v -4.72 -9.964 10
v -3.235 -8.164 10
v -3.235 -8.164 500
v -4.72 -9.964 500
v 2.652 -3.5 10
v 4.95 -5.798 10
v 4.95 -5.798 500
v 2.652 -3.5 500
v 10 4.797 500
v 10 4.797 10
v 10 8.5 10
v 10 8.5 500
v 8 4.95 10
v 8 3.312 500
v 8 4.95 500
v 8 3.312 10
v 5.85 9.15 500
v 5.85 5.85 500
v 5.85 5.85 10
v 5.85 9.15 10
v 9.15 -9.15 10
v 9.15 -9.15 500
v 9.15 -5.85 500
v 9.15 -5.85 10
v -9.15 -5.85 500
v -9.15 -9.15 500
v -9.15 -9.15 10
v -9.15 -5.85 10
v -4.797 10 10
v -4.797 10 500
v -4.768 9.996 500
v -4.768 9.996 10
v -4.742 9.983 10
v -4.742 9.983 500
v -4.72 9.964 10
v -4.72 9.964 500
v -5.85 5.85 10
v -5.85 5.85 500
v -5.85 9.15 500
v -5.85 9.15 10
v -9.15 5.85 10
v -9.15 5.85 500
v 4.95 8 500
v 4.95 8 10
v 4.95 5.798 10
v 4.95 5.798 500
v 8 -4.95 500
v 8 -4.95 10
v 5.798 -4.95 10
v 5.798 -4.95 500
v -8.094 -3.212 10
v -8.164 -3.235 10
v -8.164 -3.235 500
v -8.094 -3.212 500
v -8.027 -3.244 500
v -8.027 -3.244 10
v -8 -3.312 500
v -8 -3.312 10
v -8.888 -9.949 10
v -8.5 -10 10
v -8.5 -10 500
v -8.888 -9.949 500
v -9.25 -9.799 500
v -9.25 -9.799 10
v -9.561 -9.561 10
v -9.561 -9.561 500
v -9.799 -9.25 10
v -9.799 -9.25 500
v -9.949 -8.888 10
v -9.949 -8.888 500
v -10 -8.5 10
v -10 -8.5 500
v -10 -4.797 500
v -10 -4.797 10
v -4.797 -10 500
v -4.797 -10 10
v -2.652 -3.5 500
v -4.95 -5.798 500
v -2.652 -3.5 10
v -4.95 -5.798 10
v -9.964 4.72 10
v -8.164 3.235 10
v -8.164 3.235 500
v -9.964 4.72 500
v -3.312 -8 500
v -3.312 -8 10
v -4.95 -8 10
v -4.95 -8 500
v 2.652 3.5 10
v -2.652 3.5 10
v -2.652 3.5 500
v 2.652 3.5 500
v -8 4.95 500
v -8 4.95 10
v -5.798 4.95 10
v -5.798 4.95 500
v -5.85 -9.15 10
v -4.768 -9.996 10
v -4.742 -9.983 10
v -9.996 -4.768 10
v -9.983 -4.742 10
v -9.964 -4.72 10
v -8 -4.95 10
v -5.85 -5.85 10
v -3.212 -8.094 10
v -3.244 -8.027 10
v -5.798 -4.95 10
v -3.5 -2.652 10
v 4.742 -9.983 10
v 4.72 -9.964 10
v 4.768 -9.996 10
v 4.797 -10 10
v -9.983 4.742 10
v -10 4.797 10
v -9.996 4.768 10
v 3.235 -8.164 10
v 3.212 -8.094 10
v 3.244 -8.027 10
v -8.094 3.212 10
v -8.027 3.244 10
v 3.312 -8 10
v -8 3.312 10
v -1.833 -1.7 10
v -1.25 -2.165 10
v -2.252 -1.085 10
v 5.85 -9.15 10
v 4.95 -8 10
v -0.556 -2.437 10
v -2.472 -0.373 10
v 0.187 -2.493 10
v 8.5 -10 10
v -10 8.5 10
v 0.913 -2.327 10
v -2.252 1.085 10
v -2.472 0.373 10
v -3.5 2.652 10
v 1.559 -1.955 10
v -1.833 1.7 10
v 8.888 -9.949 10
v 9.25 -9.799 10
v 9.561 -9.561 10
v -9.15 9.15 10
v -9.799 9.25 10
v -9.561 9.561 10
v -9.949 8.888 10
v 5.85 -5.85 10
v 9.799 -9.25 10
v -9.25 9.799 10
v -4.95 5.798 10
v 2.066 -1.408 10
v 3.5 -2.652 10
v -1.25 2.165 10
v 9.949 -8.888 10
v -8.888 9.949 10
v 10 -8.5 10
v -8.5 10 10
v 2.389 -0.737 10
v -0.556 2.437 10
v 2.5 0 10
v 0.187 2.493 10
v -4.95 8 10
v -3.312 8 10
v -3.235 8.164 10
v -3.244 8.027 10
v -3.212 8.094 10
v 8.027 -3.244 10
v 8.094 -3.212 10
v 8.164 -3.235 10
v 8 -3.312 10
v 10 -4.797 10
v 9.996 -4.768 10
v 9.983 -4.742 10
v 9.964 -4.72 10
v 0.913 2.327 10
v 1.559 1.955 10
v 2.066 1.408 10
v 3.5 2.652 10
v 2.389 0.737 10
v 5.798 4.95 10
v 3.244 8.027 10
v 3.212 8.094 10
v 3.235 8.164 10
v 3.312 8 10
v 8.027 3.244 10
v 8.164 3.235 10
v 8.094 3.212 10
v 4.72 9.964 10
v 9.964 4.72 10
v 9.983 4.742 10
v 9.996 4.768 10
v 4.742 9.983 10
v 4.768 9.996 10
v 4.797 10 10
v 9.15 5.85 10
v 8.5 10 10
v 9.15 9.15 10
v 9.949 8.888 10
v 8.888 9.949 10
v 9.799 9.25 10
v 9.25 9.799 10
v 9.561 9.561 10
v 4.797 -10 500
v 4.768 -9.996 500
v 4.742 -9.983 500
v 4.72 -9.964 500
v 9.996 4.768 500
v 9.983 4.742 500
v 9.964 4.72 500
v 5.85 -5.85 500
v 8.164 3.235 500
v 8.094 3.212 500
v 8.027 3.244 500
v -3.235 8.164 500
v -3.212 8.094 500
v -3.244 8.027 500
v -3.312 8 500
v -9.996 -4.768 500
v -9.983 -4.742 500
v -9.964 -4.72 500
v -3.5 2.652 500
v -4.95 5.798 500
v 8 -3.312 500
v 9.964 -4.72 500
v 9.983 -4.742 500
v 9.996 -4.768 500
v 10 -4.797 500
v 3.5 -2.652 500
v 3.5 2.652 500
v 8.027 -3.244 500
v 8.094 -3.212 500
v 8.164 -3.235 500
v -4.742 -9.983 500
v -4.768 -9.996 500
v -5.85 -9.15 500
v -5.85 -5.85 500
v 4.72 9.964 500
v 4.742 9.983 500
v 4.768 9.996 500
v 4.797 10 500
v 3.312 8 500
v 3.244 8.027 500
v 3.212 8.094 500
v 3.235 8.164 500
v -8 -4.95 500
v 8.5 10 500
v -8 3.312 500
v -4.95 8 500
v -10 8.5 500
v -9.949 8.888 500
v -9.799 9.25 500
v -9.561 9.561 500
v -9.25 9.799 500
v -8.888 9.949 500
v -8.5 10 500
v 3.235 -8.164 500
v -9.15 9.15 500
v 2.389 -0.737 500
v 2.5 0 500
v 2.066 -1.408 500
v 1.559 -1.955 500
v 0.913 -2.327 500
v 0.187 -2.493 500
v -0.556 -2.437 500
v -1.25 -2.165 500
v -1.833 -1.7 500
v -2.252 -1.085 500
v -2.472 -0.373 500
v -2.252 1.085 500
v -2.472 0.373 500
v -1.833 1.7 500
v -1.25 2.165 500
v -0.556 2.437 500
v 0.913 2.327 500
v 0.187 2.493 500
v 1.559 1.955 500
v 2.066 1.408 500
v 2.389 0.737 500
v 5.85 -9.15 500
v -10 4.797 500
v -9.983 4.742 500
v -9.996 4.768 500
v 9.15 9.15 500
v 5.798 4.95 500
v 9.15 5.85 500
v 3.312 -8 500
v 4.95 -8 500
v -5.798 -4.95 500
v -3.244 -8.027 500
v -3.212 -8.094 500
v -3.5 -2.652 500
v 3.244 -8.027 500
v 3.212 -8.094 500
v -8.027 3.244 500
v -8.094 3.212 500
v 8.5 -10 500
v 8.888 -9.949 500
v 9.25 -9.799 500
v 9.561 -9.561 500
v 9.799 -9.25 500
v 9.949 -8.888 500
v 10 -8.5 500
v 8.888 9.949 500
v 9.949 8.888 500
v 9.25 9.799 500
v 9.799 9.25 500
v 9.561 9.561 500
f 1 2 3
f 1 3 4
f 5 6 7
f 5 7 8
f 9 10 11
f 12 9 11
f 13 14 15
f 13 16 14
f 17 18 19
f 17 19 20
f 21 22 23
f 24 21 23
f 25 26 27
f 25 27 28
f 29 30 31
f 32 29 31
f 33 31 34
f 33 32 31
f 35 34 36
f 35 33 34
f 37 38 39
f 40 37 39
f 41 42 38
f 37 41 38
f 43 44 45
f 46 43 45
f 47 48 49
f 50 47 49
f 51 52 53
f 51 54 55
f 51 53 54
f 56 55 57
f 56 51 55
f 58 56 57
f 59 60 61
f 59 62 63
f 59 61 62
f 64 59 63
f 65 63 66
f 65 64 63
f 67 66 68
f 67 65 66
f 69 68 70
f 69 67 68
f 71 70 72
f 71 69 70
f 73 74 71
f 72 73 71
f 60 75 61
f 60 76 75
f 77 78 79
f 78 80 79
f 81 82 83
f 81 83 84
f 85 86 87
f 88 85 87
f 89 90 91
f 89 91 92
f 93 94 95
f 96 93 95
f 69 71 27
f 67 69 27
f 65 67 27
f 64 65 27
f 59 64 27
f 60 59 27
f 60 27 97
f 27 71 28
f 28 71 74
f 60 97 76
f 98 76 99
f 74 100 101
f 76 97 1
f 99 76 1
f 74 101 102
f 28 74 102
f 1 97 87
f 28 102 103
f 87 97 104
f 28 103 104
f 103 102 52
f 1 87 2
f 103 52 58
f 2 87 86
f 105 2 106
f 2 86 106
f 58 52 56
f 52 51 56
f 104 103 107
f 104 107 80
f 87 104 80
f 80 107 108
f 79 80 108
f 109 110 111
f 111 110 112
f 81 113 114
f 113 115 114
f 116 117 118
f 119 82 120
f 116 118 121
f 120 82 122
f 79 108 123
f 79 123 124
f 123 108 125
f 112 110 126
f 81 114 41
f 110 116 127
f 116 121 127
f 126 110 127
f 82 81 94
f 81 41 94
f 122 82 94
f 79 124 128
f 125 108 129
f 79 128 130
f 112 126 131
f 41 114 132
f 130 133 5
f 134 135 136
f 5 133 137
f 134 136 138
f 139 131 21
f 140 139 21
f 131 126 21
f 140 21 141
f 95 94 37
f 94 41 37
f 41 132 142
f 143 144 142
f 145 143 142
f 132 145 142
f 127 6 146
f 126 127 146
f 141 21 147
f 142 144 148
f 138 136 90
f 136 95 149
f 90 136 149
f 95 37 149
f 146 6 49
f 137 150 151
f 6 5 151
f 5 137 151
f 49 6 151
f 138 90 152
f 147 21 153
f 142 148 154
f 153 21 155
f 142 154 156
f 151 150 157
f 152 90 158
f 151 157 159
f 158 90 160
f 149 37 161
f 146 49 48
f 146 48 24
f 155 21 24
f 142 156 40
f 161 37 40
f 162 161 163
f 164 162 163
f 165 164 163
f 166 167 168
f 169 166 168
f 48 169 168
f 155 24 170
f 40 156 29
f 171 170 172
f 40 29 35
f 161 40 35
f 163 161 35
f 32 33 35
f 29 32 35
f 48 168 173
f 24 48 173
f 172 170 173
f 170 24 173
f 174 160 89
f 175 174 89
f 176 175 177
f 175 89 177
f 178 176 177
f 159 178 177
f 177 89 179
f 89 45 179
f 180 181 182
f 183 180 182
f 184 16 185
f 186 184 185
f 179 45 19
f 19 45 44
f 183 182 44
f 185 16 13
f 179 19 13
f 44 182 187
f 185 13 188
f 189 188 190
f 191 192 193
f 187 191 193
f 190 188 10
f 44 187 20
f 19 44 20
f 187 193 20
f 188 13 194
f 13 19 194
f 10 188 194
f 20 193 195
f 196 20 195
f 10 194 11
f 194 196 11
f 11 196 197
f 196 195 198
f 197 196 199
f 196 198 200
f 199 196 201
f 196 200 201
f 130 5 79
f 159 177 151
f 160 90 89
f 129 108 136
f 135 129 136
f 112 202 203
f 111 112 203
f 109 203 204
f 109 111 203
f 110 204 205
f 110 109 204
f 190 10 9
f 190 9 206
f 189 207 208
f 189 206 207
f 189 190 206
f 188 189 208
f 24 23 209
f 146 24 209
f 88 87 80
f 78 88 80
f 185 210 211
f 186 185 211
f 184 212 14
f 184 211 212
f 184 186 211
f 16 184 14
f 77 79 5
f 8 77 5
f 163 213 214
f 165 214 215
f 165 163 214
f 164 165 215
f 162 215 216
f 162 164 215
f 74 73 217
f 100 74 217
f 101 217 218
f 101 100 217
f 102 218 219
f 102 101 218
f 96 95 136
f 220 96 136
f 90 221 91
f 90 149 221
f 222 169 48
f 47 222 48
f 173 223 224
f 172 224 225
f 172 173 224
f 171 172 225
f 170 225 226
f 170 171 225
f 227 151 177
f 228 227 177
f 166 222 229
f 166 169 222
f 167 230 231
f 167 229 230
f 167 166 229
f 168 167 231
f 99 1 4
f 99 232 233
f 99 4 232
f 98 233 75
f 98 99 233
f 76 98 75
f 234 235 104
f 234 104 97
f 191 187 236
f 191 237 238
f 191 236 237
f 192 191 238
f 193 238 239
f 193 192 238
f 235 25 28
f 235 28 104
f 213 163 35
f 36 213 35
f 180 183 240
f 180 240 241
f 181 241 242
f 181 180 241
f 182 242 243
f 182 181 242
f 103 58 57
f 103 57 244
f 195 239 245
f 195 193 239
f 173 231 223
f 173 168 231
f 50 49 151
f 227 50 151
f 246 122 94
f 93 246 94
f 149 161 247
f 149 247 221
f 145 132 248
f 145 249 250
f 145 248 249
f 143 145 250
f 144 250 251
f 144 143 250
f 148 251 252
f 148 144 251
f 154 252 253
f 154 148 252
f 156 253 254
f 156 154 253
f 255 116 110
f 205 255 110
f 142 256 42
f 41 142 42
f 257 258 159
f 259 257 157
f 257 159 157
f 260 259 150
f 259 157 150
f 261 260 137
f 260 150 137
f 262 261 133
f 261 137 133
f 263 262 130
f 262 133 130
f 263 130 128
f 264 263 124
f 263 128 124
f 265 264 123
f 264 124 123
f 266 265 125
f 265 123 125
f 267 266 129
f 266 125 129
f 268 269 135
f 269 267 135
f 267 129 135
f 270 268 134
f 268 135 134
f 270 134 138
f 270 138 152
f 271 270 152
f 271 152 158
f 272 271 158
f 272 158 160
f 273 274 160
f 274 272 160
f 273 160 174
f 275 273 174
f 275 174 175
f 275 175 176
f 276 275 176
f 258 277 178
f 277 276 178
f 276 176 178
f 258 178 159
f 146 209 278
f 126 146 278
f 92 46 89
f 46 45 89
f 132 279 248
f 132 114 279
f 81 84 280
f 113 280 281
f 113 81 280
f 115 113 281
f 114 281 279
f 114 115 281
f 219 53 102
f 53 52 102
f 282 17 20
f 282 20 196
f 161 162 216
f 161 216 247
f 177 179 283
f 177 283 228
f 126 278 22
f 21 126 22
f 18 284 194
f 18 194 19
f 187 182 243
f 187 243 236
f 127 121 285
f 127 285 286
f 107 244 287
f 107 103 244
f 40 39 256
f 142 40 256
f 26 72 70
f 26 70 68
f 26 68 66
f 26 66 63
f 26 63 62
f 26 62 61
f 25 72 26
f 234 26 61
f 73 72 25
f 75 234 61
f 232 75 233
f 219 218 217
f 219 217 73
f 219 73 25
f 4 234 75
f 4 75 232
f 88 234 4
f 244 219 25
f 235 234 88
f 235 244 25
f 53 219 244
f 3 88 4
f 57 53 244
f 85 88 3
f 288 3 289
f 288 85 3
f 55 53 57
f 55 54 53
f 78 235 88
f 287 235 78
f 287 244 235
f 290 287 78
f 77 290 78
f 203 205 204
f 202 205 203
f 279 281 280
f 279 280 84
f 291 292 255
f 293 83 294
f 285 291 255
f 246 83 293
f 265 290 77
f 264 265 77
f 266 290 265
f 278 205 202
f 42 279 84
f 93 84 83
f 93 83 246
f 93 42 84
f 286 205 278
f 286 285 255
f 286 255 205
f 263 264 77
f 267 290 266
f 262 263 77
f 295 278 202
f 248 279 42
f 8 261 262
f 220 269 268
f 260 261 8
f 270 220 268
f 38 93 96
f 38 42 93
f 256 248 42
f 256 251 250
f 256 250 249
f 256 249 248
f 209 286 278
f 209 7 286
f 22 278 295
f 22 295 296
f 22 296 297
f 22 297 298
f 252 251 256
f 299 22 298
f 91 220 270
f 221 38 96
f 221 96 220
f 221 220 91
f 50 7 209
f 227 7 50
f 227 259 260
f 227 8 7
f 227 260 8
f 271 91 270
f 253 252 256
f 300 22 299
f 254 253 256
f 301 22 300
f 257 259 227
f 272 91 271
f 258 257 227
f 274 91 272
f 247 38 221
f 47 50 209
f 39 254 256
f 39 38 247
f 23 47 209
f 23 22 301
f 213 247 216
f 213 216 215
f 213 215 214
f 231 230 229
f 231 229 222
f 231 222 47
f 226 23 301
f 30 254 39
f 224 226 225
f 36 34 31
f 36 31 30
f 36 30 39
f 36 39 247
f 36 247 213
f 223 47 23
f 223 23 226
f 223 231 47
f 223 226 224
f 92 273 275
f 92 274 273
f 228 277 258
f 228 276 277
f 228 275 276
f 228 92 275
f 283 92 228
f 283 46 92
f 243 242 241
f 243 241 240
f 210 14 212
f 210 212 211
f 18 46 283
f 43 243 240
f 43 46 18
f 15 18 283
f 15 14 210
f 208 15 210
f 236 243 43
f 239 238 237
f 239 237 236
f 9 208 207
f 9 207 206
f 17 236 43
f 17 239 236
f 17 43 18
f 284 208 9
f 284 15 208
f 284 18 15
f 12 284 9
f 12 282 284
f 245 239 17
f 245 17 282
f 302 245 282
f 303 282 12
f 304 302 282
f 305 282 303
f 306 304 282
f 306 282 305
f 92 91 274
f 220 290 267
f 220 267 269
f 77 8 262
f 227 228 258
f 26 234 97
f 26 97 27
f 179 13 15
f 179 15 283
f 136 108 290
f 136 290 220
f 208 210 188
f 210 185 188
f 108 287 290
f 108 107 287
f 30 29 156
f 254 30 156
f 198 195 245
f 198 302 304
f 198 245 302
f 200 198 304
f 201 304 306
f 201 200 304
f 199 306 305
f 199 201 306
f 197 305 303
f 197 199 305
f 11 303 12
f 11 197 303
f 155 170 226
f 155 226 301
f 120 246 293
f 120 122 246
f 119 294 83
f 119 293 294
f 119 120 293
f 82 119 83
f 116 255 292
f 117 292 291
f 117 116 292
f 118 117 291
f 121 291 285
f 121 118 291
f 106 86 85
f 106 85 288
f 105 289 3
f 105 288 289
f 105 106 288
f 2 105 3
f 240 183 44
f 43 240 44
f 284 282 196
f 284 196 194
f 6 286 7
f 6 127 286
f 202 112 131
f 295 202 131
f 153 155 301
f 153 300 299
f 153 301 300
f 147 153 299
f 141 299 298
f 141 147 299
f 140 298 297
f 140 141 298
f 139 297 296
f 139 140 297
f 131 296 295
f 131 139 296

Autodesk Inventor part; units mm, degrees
ref_plane "Начальная плоскость" through (0, 0, 10) normal (0, 0, 1) x (1, 0, 0)
ref_plane "Конечная плоскость" through (0, 0, 500) normal (0, 0, 1) x (1, 0, 0)
sketch "Эскиз" plane through (0, 0, 0) normal (0, 0, 1) x (1, 0, 0)
  line L0 (-14.4349, 0) -> (14.4349, 0) projected
  line L1 (0, -14) -> (0, 14) projected
  line L2 (0, 0) -> (7.5, 7.5) construction
  circle A0 centre (7.5, 7.5) radius 1.65 construction
  line L3 (5.85, 9.15) -> (9.15, 9.15)
  line L4 (9.15, 9.15) -> (9.15, 5.85)
  line L5 (9.15, 5.85) -> (5.85, 5.85)
  line L6 (5.85, 5.85) -> (5.85, 9.15)
  line L7 (3.235, 8.1636) -> (4.72, 9.9636)
  line L8 (4.7971, 10) -> (8.5, 10)
  line L9 (3.3121, 8) -> (4.95, 8)
  line L10 (4.95, 8) -> (4.95, 5.7985)
  line L11 (4.95, 5.7985) -> (2.6515, 3.5)
  line L12 (0, 3.5) -> (2.6515, 3.5)
  circle A1 centre (0, 0) radius 2.5
  line L13 (8.1636, 3.235) -> (9.9636, 4.72)
  line L14 (10, 4.7971) -> (10, 8.5)
  line L15 (8, 3.3121) -> (8, 4.95)
  line L16 (8, 4.95) -> (5.7985, 4.95)
  line L17 (5.7985, 4.95) -> (3.5, 2.6515)
  line L18 (3.5, 0) -> (3.5, 2.6515)
  arc A2 (10, 8.5) -> (8.5, 10) centre (8.5, 8.5) ccw
  line L19 (0, 0) -> (-7.5, 7.5) construction
  circle A3 centre (-7.5, 7.5) radius 1.65 construction
  line L20 (-5.85, 9.15) -> (-9.15, 9.15)
  line L21 (-9.15, 9.15) -> (-9.15, 5.85)
  line L22 (-9.15, 5.85) -> (-5.85, 5.85)
  line L23 (-5.85, 5.85) -> (-5.85, 9.15)
  line L24 (-3.235, 8.1636) -> (-4.72, 9.9636)
  line L25 (-4.7971, 10) -> (-8.5, 10)
  line L26 (-3.3121, 8) -> (-4.95, 8)
  line L27 (-4.95, 8) -> (-4.95, 5.7985)
  line L28 (-4.95, 5.7985) -> (-2.6515, 3.5)
  line L29 (0, 3.5) -> (-2.6515, 3.5)
  line L30 (-3.5, 0) -> (-3.5, 2.6515)
  line L31 (-5.7985, 4.95) -> (-3.5, 2.6515)
  line L32 (-8, 4.95) -> (-5.7985, 4.95)
  line L33 (-8, 3.3121) -> (-8, 4.95)
  line L34 (-8.1636, 3.235) -> (-9.9636, 4.72)
  line L35 (-10, 4.7971) -> (-10, 8.5)
  arc A4 (-8.5, 10) -> (-10, 8.5) centre (-8.5, 8.5) ccw
  line L36 (0, 14) -> (0, -14)
  line L37 (0, 0) -> (7.5, -7.5) construction
  circle A5 centre (7.5, -7.5) radius 1.65 construction
  line L38 (5.85, -9.15) -> (9.15, -9.15)
  line L39 (9.15, -9.15) -> (9.15, -5.85)
  line L40 (9.15, -5.85) -> (5.85, -5.85)
  line L41 (5.85, -5.85) -> (5.85, -9.15)
  line L42 (3.235, -8.1636) -> (4.72, -9.9636)
  line L43 (4.7971, -10) -> (8.5, -10)
  line L44 (3.3121, -8) -> (4.95, -8)
  line L45 (4.95, -8) -> (4.95, -5.7985)
  line L46 (4.95, -5.7985) -> (2.6515, -3.5)
  line L47 (0, -3.5) -> (2.6515, -3.5)
  line L48 (3.5, 0) -> (3.5, -2.6515)
  line L49 (5.7985, -4.95) -> (3.5, -2.6515)
  line L50 (8, -4.95) -> (5.7985, -4.95)
  line L51 (8, -3.3121) -> (8, -4.95)
  line L52 (8.1636, -3.235) -> (9.9636, -4.72)
  line L53 (10, -4.7971) -> (10, -8.5)
  arc A6 (8.5, -10) -> (10, -8.5) centre (8.5, -8.5) ccw
  line L54 (0, 0) -> (-7.5, -7.5) construction
  line L55 (-4.95, -8) -> (-4.95, -5.7985)
  line L56 (-3.3121, -8) -> (-4.95, -8)
  line L57 (-5.7985, -4.95) -> (-3.5, -2.6515)
  line L58 (-4.95, -5.7985) -> (-2.6515, -3.5)
  line L59 (-3.5, 0) -> (-3.5, -2.6515)
  line L60 (0, -3.5) -> (-2.6515, -3.5)
  circle A7 centre (-7.5, -7.5) radius 1.65 construction
  line L61 (-5.85, -5.85) -> (-5.85, -9.15)
  line L62 (-5.85, -9.15) -> (-9.15, -9.15)
  line L63 (-9.15, -9.15) -> (-9.15, -5.85)
  line L64 (-9.15, -5.85) -> (-5.85, -5.85)
  line L65 (-3.235, -8.1636) -> (-4.72, -9.9636)
  line L66 (-8, -4.95) -> (-5.7985, -4.95)
  line L67 (-8, -3.3121) -> (-8, -4.95)
  line L68 (-8.1636, -3.235) -> (-9.9636, -4.72)
  line L69 (-4.7971, -10) -> (-8.5, -10)
  line L70 (-10, -4.7971) -> (-10, -8.5)
  arc A8 (-10, -8.5) -> (-8.5, -10) centre (-8.5, -8.5) ccw
  arc A9 (3.235, 8.1636) -> (3.3121, 8) centre (3.3121, 8.1) ccw
  arc A10 (4.7971, 10) -> (4.72, 9.9636) centre (4.7971, 9.9) ccw
  arc A11 (8, 3.3121) -> (8.1636, 3.235) centre (8.1, 3.3121) ccw
  arc A12 (9.9636, 4.72) -> (10, 4.7971) centre (9.9, 4.7971) ccw
  arc A13 (-3.3121, 8) -> (-3.235, 8.1636) centre (-3.3121, 8.1) ccw
  arc A14 (-4.72, 9.9636) -> (-4.7971, 10) centre (-4.7971, 9.9) ccw
  arc A15 (-8.1636, 3.235) -> (-8, 3.3121) centre (-8.1, 3.3121) ccw
  arc A16 (-10, 4.7971) -> (-9.9636, 4.72) centre (-9.9, 4.7971) ccw
  arc A17 (-8, -3.3121) -> (-8.1636, -3.235) centre (-8.1, -3.3121) ccw
  arc A18 (-9.9636, -4.72) -> (-10, -4.7971) centre (-9.9, -4.7971) ccw
  arc A19 (-3.235, -8.1636) -> (-3.3121, -8) centre (-3.3121, -8.1) ccw
  arc A20 (-4.7971, -10) -> (-4.72, -9.9636) centre (-4.7971, -9.9) ccw
  arc A21 (4.72, -9.9636) -> (4.7971, -10) centre (4.7971, -9.9) ccw
  arc A22 (3.3121, -8) -> (3.235, -8.1636) centre (3.3121, -8.1) ccw
  arc A23 (8.1636, -3.235) -> (8, -3.3121) centre (8.1, -3.3121) ccw
  arc A24 (10, -4.7971) -> (9.9636, -4.72) centre (9.9, -4.7971) ccw
  point P0 (3.1, 8)
  point P1 (4.75, 10)
  point P2 (7.5, 9.15)
  point P3 (8, 3.1)
  point P4 (10, 4.75)
  point P5 (7.5, 5.85)
  point P6 (9.15, 7.5)
  point P7 (-3.1, 8)
  point P8 (-4.75, 10)
  point P9 (-7.5, 9.15)
  point P10 (-8, 3.1)
  point P11 (-10, 4.75)
  point P12 (-7.5, 5.85)
  point P13 (-9.15, 7.5)
  point P14 (3.1, -8)
  point P15 (4.75, -10)
  point P16 (7.5, -9.15)
  point P17 (8, -3.1)
  point P18 (10, -4.75)
  point P19 (7.5, -5.85)
  point P20 (9.15, -7.5)
  point P21 (-3.1, -8)
  point P22 (-7.5, -5.85)
  point P23 (-7.5, -9.15)
  point P24 (-9.15, -7.5)
  point P25 (-4.75, -10)
  point P26 (-8, -3.1)
  point P27 (-10, -4.75)
  dimension "d0" = 45
  dimension "d1" = 3.3
  dimension "d2" = 1.5
  dimension "d3" = 1.2
  dimension "d4" = 5
  dimension "d5" = 6.5
  dimension "d6" = 15
  dimension "d7" = 20
  dimension "d8" = 9.9
  dimension "d9" = 9.5
  dimension "d10" = 6.2
  dimension "d11" = 2
  dimension "d18" = 0.1
  dimension "d19" = 0.1
extrude "Тело" add sketch "Эскиз" along normal up to surface (490 mm away) from surface at 10 contours A1 L1 L12 L11 L10 L9 A9 L7 A10 L8 A2 L14 A12 L13 A11 L15 L16 L17 L18 L0 | L0 L48 L49 L50 L51 A23 L52 A24 L53 A6 L43 A21 L42 A22 L44 L45 L46 L47 L1 A1 | A1 L0 L30 L31 L32 L33 A15 L34 A16 L35 A4 L25 A14 L24 A13 L26 L27 L28 L29 L1 | L1 L60 L58 L55 L56 A19 L65 A20 L69 A8 L70 A18 L68 A17 L67 L66 L57 L59 L0 A1
sketch "Эскиз2" plane through (0, 0, 0) normal (0, 0, 1) x (1, 0, 0)
  line L0 (0, 0) -> (10, 0)
ref_plane "РабПлоскость3" through (0, 0, 0) normal (0, -1, 0) x (1, 0, 0)
sketch "Эскиз3" plane through (0, 0, 0) normal (0, -1, 0) x (1, 0, 0)
  line L0 (-2, 10) -> (12, 10)
  line L1 (-2, 500) -> (12, 500)
  dimension "d25" = 490
ref_plane "РабПлоскость4" through (330, 0, 500) normal (0, 0, 1) x (1, 0, 0)
split "Разделение1" plane through (330, 0, 500) removes the side toward (0, 0, 1)
ref_plane "РабПлоскость5" through (300, 0, 10) normal (0, 0, -1) x (-1, 0, 0)
split "Разделение2" plane through (300, 0, 10) removes the side toward (0, 0, -1)
ref_plane "РабПлоскость6" through (0, 40, -10) normal (0, 0, -1) x (-1, 0, 0)
split "Разделение3" plane through (0, 40, -10) removes the side toward (0, 0, -1)
properties part number "короткая палка" material "Алюминий 6061"
